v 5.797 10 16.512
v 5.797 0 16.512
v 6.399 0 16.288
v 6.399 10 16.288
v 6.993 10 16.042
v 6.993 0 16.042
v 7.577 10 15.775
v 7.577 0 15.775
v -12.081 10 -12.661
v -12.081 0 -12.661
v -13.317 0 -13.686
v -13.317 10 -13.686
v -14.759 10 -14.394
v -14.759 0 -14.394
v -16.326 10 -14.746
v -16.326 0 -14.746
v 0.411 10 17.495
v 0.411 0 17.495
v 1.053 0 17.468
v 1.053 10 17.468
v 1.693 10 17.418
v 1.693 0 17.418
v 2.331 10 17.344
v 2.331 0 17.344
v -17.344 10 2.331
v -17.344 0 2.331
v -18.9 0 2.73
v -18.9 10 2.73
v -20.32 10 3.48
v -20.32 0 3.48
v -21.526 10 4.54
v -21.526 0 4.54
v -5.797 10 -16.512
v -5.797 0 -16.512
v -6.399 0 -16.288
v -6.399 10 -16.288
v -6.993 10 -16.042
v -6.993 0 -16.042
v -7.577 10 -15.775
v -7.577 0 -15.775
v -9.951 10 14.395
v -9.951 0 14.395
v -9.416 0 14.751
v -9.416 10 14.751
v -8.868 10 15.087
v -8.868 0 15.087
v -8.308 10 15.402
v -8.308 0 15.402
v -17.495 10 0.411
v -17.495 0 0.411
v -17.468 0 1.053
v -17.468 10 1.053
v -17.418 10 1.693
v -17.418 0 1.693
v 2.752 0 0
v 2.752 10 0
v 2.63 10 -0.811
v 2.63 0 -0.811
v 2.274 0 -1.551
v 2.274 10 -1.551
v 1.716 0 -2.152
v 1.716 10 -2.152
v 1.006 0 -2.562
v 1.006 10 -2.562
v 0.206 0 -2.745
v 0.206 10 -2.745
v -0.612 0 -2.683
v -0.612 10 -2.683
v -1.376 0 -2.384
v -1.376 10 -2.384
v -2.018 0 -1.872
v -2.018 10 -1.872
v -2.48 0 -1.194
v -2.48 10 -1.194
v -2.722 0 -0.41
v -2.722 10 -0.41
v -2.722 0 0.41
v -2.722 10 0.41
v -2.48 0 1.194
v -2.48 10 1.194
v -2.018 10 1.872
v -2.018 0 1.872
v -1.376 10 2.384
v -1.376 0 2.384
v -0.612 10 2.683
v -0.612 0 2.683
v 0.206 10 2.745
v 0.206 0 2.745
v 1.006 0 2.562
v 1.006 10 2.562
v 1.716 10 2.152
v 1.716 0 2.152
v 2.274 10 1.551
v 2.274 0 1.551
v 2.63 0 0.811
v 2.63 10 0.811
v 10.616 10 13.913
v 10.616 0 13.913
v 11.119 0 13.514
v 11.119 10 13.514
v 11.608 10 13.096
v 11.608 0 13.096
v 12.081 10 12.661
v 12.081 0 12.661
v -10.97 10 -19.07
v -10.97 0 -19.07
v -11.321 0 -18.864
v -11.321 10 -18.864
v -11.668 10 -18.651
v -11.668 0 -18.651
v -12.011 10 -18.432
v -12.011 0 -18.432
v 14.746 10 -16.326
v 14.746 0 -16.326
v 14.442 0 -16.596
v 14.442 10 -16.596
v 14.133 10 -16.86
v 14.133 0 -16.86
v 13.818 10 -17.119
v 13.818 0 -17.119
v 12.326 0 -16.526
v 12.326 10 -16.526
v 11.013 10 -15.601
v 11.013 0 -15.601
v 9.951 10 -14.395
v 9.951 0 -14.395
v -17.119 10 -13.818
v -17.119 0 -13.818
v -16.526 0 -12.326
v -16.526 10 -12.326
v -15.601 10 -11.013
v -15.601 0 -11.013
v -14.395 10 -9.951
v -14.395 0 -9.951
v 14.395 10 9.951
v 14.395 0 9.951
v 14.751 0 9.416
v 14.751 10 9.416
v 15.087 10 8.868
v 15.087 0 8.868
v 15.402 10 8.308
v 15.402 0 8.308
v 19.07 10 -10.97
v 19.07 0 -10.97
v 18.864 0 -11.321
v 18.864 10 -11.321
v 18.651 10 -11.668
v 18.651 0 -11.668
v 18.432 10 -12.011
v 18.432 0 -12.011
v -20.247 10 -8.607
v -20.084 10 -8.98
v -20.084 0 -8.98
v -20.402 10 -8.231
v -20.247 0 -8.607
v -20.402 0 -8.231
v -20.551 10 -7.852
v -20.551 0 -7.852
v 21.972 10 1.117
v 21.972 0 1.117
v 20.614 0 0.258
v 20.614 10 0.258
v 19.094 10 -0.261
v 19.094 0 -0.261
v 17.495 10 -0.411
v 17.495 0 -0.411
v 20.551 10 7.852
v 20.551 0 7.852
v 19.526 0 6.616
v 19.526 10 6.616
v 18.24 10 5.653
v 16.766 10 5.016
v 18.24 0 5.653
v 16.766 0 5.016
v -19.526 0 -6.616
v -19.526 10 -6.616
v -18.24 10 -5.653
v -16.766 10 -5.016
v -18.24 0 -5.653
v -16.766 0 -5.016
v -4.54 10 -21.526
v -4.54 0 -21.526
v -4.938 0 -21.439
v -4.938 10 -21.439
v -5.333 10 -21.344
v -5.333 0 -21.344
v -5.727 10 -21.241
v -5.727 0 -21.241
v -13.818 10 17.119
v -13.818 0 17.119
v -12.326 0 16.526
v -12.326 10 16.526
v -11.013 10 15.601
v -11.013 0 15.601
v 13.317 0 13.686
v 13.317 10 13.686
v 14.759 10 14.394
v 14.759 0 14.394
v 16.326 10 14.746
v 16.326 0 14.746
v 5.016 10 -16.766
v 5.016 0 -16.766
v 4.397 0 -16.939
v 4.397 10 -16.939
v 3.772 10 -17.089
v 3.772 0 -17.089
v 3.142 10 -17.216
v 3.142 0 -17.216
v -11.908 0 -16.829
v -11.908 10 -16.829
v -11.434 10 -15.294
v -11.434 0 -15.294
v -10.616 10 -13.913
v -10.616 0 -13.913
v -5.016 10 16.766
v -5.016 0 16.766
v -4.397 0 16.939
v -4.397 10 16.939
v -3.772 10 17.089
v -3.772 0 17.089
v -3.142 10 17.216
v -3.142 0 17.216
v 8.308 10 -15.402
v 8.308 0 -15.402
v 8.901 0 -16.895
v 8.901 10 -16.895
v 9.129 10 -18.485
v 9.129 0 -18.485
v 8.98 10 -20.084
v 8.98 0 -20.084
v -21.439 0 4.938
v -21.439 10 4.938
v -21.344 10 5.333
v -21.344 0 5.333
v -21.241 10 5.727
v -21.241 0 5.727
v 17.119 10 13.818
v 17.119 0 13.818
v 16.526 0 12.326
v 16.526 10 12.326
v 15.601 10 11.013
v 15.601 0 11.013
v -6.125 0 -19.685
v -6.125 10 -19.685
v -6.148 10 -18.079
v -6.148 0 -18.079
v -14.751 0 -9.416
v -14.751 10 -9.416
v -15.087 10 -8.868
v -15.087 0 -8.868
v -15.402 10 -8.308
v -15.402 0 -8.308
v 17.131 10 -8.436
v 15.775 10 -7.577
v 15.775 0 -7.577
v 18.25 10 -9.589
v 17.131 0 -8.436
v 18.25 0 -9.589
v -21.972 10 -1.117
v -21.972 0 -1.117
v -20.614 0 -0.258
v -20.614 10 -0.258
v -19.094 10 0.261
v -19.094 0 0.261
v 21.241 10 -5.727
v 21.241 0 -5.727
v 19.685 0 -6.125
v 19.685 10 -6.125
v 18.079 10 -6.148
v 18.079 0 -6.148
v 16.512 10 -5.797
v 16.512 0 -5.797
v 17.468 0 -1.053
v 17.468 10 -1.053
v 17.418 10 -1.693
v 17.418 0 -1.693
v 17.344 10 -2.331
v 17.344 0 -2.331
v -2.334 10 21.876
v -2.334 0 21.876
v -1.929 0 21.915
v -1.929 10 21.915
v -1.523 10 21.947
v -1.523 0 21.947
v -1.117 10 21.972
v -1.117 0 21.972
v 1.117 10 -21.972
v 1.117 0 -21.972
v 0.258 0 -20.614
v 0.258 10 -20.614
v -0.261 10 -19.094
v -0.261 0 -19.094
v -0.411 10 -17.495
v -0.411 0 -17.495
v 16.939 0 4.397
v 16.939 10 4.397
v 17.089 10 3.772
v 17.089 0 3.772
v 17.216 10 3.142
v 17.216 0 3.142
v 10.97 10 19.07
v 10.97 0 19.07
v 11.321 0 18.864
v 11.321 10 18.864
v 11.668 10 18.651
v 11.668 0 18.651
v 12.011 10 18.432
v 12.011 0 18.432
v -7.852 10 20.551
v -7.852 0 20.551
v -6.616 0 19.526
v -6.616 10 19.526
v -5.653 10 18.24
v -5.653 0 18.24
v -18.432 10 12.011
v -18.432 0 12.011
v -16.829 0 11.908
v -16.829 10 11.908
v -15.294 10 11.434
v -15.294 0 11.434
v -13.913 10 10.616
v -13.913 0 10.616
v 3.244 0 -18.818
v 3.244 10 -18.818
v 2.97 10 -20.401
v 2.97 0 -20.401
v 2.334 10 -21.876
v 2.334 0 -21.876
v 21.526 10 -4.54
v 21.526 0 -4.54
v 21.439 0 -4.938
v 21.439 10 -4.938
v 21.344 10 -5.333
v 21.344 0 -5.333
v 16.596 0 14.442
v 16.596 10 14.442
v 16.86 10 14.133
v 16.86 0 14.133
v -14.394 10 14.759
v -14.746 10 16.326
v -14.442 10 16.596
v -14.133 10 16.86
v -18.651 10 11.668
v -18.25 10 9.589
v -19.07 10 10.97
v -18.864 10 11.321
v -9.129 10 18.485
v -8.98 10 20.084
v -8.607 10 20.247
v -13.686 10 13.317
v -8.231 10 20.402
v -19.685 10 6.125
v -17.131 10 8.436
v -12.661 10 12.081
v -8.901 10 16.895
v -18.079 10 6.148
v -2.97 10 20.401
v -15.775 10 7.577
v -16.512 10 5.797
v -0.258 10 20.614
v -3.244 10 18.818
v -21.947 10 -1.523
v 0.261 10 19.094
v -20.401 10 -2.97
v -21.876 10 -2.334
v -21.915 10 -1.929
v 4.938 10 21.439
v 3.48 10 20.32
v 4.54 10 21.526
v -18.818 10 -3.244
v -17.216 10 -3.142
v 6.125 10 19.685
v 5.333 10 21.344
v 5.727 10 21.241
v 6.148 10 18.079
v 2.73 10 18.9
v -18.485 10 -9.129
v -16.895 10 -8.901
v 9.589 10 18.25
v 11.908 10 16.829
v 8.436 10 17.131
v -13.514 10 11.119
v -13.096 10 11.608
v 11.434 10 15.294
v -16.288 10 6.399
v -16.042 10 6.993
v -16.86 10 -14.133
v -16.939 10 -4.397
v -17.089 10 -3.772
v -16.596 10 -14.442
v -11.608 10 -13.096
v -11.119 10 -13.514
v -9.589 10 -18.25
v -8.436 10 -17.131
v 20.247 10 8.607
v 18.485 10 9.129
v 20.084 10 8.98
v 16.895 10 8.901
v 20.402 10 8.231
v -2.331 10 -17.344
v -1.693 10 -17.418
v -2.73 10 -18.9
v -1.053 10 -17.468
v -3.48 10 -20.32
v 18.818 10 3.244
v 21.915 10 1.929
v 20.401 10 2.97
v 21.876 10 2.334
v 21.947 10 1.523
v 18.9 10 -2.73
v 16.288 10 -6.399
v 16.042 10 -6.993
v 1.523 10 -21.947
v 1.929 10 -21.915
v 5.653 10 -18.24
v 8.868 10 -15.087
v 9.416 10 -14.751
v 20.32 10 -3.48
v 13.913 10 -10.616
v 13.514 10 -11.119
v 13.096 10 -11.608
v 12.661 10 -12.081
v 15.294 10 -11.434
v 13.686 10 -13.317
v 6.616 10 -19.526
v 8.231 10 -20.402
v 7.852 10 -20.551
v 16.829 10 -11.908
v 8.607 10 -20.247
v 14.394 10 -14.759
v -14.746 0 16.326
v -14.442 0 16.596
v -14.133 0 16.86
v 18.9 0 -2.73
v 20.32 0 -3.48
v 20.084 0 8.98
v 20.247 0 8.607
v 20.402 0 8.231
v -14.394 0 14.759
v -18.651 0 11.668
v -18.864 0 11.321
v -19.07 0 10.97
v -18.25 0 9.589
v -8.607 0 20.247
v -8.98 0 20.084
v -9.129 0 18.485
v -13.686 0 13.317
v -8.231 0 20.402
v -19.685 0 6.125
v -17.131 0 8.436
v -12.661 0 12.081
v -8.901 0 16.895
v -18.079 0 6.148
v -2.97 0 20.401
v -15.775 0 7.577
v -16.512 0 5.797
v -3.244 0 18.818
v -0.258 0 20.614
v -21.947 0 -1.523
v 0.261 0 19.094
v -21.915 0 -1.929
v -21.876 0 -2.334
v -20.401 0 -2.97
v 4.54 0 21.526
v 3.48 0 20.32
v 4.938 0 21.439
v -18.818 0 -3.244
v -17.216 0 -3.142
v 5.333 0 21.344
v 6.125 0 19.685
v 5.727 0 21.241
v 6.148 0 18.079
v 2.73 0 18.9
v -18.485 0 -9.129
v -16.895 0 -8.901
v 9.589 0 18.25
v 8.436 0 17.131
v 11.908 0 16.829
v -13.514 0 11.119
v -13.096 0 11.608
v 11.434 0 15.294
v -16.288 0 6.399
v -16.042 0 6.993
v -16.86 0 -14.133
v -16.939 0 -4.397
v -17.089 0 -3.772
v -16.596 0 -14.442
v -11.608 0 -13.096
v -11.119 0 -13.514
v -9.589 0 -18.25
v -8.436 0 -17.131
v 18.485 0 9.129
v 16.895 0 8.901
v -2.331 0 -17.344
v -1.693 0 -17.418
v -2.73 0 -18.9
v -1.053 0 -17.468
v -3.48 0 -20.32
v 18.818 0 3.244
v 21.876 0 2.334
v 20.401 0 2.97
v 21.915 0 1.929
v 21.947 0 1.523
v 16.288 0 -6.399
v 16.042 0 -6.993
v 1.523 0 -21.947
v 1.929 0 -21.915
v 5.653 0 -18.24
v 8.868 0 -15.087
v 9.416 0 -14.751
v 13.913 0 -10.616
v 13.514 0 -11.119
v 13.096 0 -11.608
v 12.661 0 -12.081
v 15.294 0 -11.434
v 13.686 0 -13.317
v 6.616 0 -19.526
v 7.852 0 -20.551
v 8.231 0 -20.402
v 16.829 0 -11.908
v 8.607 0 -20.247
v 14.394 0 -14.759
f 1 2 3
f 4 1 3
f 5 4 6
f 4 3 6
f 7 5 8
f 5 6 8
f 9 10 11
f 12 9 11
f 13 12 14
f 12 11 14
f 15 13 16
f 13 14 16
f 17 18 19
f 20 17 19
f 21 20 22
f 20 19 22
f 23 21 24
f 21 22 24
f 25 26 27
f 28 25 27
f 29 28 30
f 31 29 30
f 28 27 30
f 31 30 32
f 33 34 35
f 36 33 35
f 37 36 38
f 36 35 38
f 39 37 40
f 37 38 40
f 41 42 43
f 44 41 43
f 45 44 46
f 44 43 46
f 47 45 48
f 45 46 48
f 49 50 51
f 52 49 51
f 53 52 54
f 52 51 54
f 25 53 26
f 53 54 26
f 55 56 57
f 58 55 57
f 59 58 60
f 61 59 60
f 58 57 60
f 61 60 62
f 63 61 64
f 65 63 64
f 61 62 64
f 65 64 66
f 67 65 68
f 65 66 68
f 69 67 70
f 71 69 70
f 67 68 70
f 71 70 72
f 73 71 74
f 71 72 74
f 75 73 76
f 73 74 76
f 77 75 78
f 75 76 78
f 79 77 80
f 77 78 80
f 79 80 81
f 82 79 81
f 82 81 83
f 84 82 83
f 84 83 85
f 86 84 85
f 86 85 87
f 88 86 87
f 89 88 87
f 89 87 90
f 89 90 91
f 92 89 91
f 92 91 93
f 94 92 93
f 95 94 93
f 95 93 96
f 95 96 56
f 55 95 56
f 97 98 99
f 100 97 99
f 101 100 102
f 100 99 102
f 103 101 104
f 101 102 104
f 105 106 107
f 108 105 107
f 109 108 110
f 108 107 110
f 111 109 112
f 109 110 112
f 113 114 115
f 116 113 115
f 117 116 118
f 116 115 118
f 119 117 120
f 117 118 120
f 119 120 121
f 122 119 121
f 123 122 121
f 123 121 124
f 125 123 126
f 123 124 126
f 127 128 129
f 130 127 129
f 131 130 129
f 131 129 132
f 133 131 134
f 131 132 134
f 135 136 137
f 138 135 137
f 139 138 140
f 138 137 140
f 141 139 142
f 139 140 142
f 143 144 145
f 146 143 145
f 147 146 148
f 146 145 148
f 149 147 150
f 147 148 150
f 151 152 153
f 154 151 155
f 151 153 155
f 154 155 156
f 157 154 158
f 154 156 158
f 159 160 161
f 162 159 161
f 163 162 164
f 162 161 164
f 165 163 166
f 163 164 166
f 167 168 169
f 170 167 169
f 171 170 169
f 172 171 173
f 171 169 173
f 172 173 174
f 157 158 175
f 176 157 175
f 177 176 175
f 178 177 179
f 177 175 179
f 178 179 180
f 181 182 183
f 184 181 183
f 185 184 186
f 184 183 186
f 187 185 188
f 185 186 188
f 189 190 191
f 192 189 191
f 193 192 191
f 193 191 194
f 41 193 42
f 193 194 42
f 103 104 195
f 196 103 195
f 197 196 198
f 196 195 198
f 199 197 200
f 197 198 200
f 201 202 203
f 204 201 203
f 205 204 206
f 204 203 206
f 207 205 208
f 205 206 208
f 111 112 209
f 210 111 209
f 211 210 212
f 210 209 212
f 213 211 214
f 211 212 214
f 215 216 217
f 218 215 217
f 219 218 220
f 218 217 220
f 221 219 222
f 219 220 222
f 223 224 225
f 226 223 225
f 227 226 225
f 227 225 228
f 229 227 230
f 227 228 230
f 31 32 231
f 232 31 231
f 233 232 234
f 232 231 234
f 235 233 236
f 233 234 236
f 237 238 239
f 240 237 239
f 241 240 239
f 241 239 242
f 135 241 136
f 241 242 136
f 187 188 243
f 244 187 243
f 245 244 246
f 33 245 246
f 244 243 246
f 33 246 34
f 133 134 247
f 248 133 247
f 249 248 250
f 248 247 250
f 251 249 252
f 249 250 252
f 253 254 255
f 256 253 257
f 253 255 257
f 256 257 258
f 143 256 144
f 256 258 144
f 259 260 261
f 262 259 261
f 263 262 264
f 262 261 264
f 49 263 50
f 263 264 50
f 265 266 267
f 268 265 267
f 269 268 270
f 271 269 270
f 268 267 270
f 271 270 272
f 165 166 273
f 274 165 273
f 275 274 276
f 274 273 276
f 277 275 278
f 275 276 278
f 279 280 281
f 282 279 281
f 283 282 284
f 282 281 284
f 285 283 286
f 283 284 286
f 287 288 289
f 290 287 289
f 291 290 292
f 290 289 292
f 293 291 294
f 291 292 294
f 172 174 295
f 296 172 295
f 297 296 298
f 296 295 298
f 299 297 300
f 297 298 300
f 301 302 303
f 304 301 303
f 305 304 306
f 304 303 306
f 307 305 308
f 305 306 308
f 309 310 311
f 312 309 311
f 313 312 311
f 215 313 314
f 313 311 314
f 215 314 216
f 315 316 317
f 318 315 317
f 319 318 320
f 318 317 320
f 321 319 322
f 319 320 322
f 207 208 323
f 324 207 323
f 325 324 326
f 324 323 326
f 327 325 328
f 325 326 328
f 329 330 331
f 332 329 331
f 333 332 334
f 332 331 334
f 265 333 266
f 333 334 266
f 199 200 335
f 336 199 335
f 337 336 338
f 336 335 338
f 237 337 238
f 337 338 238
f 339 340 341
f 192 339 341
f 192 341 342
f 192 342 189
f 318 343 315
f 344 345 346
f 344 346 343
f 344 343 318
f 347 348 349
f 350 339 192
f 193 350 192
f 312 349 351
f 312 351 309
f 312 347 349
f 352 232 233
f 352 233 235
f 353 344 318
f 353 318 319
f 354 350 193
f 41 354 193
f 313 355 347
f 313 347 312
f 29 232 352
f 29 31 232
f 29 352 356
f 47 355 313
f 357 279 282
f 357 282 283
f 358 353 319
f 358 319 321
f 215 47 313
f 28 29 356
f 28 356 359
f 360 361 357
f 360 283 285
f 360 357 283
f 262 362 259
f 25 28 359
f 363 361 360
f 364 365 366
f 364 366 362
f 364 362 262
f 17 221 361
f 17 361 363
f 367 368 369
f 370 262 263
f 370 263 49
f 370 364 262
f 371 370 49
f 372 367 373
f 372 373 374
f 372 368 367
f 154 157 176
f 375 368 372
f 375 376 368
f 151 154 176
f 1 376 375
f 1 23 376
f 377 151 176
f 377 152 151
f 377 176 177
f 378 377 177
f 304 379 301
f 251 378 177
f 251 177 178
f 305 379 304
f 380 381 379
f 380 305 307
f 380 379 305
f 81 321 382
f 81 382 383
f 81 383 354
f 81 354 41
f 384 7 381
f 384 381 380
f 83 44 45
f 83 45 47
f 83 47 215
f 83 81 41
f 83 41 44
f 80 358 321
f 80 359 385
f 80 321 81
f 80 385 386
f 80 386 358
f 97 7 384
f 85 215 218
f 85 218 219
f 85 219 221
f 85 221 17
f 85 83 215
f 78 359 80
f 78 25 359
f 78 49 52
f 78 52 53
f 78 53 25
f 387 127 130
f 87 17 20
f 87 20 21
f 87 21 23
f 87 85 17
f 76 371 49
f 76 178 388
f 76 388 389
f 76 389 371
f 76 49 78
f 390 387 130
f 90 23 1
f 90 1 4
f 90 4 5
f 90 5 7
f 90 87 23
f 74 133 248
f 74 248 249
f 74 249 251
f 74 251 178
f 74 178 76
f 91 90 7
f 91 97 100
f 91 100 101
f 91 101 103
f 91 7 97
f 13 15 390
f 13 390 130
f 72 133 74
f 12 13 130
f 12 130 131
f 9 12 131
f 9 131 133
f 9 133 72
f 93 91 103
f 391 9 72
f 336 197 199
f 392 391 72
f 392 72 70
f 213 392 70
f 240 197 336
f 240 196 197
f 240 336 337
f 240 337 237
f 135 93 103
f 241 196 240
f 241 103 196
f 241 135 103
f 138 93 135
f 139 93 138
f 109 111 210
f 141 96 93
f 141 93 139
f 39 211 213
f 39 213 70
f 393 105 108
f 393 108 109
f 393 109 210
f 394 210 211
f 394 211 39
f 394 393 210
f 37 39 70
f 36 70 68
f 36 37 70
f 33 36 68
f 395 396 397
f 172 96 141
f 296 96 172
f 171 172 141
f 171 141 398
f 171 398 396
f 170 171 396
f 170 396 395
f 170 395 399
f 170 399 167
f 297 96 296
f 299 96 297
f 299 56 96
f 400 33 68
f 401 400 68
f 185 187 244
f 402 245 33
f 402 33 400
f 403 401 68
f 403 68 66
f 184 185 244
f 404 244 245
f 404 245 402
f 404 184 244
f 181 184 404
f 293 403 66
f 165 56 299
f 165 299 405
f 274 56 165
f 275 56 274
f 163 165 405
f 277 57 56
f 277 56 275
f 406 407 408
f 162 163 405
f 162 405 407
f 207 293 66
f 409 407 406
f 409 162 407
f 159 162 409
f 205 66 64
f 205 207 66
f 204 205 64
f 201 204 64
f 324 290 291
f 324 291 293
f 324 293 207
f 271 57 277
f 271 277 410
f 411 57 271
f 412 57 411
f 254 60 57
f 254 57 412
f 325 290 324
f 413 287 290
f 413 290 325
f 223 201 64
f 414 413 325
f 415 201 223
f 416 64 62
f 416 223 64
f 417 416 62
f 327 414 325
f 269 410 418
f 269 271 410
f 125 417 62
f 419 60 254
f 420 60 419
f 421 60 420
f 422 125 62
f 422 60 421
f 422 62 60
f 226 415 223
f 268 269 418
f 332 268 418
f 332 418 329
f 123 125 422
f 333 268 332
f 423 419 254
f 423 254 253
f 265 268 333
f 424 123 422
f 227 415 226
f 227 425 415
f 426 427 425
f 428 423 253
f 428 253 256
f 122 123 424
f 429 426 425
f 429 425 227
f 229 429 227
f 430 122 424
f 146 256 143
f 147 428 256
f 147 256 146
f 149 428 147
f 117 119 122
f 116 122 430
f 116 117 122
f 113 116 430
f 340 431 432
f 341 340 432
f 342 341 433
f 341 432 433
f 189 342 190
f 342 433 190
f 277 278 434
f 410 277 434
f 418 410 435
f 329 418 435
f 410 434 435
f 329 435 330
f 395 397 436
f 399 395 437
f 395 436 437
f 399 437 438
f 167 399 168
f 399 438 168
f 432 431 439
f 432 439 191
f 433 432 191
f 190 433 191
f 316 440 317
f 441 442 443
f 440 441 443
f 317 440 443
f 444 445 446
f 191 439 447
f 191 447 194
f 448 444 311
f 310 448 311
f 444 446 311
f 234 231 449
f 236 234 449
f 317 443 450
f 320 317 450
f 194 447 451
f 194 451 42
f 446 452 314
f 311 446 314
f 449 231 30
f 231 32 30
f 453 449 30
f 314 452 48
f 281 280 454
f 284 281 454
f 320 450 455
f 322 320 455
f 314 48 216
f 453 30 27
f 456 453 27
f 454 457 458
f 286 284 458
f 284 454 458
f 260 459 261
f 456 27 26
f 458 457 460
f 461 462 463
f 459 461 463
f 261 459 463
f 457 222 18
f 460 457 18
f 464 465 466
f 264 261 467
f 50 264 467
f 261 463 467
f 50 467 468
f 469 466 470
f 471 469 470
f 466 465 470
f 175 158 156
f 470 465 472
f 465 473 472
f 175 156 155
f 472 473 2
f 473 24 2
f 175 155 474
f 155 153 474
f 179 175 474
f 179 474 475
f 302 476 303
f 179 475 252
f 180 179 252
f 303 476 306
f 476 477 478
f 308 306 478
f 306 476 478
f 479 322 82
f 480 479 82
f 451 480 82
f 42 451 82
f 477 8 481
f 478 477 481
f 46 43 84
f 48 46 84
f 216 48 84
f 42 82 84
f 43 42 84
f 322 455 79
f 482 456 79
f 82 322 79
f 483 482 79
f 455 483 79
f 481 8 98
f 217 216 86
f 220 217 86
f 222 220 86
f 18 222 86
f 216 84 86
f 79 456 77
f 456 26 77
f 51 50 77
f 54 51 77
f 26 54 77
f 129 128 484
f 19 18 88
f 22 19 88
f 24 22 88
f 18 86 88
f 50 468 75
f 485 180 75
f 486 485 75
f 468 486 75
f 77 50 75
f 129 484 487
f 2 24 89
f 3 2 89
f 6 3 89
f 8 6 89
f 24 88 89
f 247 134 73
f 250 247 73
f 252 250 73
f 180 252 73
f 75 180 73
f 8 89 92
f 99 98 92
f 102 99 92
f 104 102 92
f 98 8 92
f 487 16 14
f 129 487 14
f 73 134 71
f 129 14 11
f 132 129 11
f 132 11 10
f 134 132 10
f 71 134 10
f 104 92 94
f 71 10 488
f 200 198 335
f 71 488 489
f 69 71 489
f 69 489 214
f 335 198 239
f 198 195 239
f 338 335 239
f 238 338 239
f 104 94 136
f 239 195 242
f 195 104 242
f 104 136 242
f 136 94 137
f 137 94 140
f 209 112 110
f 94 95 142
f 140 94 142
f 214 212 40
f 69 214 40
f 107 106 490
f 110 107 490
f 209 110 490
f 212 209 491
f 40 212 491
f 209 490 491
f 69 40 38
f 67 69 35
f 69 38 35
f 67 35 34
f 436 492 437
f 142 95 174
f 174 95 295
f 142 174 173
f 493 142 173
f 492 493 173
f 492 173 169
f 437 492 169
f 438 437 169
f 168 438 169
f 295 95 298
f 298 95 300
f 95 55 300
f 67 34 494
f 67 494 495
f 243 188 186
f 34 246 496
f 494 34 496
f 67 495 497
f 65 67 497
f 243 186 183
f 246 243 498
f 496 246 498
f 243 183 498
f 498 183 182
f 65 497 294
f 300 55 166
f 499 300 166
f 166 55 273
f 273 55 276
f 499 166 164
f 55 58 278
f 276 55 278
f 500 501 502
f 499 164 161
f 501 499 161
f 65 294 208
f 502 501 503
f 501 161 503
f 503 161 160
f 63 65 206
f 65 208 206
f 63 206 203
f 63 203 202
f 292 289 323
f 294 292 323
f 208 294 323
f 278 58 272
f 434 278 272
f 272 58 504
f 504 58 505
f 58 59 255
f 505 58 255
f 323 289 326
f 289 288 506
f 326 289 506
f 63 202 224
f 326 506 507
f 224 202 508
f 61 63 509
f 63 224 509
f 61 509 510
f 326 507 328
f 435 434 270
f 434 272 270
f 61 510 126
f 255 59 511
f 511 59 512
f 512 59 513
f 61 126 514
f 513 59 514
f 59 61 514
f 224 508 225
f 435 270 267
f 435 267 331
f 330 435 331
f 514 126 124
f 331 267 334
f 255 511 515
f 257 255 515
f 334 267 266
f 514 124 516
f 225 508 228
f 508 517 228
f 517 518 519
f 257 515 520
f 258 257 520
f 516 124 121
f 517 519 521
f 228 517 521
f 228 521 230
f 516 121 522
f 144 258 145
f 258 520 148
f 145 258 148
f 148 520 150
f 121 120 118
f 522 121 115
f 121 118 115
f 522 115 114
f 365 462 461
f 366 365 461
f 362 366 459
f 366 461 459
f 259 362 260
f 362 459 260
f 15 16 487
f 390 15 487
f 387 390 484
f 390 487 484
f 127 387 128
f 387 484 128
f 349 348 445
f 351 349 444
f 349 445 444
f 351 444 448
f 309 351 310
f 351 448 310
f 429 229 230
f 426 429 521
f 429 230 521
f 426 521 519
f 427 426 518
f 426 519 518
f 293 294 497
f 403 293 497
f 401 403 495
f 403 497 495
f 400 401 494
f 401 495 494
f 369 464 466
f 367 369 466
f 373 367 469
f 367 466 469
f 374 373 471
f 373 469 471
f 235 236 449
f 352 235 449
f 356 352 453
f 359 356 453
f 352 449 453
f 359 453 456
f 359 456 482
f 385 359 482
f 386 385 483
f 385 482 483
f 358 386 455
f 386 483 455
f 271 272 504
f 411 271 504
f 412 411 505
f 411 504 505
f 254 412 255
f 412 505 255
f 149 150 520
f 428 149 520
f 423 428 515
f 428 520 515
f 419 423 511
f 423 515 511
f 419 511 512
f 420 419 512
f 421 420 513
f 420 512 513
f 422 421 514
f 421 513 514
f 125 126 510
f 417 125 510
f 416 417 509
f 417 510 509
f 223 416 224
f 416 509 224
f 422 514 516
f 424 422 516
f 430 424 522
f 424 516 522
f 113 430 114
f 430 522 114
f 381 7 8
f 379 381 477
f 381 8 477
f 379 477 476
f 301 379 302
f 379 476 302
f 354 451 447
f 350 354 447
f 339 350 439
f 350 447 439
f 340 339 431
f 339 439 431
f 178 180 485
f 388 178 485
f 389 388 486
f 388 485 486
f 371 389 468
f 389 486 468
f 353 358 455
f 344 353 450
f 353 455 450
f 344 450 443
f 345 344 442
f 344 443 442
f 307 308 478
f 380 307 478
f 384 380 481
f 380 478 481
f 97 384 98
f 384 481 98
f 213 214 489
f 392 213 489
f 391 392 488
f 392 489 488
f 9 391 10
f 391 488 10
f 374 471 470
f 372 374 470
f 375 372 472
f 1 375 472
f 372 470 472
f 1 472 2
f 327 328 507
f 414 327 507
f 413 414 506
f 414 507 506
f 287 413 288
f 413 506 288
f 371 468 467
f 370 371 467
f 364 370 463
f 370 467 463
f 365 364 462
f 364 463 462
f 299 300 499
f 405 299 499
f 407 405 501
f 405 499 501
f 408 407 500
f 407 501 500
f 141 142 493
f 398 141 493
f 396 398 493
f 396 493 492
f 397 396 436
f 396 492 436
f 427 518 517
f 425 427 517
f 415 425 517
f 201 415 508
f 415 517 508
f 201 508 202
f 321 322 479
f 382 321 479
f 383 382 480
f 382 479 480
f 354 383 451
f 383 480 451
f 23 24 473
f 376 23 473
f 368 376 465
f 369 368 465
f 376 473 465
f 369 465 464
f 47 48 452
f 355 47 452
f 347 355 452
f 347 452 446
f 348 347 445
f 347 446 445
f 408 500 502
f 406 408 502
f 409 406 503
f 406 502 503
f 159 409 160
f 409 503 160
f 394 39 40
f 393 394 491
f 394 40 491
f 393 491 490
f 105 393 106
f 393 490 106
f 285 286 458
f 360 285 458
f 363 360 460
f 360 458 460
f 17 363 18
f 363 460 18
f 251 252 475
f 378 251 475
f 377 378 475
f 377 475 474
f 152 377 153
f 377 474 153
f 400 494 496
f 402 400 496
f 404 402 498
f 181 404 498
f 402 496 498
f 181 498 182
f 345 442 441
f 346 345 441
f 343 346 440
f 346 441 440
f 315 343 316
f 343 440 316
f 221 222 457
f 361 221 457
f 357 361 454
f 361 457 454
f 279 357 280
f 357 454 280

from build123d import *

# Parameters (mm, degrees)
EXTRUDE_1_DEPTH          = 10
SKETCH_2_R               = 2.752434458
CUT_EXTRUDE_1_DEPTH      = 1
CUT_EXTRUDE_1_DEPTH_BACK = 11


with BuildPart() as part:
    # 草图1 → 凸台-拉伸1 (new body)
    with BuildSketch(Plane(origin=(0, 0, 0), x_dir=(1, 0, 0), z_dir=(0, 1, 0))):
        with BuildLine():
            ThreePointArc((1.117051771, 21.971622501), (-0.045961741, 19.869637729), (-0.410530178, 17.495184051))
            ThreePointArc((-0.410530178, 17.495184051), (-1.373034175, 17.44605334), (-2.331373887, 17.344010372))
            ThreePointArc((-2.331373887, 17.344010372), (-3.062900273, 19.632199517), (-4.540418022, 21.526369972))
            ThreePointArc((-4.540418022, 21.526369972), (-5.135798005, 21.392138249), (-5.727225381, 21.241442734))
            ThreePointArc((-5.727225381, 21.241442734), (-6.183767943, 18.882945479), (-5.796746593, 16.512047994))
            ThreePointArc((-5.796746593, 16.512047994), (-6.696960066, 16.167891819), (-7.576862283, 15.774699932))
            ThreePointArc((-7.576862283, 15.774699932), (-8.979674551, 17.724843043), (-10.970208295, 19.069728104))
            ThreePointArc((-10.970208295, 19.069728104), (-11.494968424, 18.758083616), (-12.010881809, 18.432002554))
            ThreePointArc((-12.010881809, 18.432002554), (-11.716263855, 16.047858961), (-10.615537062, 13.912597632))
            ThreePointArc((-10.615537062, 13.912597632), (-11.365340846, 13.307104398), (-12.080674608, 12.661251953))
            ThreePointArc((-12.080674608, 12.661251953), (-14.017455719, 14.082455436), (-16.326158146, 14.746408382))
            ThreePointArc((-16.326158146, 14.746408382), (-16.728931243, 14.287857063), (-17.118829441, 13.818309541))
            ThreePointArc((-17.118829441, 13.818309541), (-16.101890228, 11.641896196), (-14.395204801, 9.95128528))
            ThreePointArc((-14.395204801, 9.95128528), (-14.921202876, 9.143724883), (-15.40194633, 8.308432417))
            ThreePointArc((-15.40194633, 8.308432417), (-17.683110656, 9.061578973), (-20.083989887, 8.979607464))
            ThreePointArc((-20.083989887, 8.979607464), (-20.325349715, 8.419035512), (-20.551066773, 7.851984112))
            ThreePointArc((-20.551066773, 7.851984112), (-18.911351397, 6.096343517), (-16.765769597, 5.01587179))
            ThreePointArc((-16.765769597, 5.01587179), (-17.016473607, 4.085293867), (-17.215568235, 3.142325628))
            ThreePointArc((-17.215568235, 3.142325628), (-19.617819516, 3.153692024), (-21.875860765, 2.333820002))
            ThreePointArc((-21.875860765, 2.333820002), (-21.932181342, 1.726100106), (-21.971622501, 1.117051771))
            ThreePointArc((-21.971622501, 1.117051771), (-19.869637729, -0.045961741), (-17.495184051, -0.410530178))
            ThreePointArc((-17.495184051, -0.410530178), (-17.44605334, -1.373034175), (-17.344010372, -2.331373887))
            ThreePointArc((-17.344010372, -2.331373887), (-19.632199517, -3.062900273), (-21.526369972, -4.540418022))
            ThreePointArc((-21.526369972, -4.540418022), (-21.392138249, -5.135798005), (-21.241442734, -5.727225381))
            ThreePointArc((-21.241442734, -5.727225381), (-18.882945479, -6.183767943), (-16.512047994, -5.796746593))
            ThreePointArc((-16.512047994, -5.796746593), (-16.167891819, -6.696960066), (-15.774699932, -7.576862283))
            ThreePointArc((-15.774699932, -7.576862283), (-17.724843043, -8.979674551), (-19.069728104, -10.970208295))
            ThreePointArc((-19.069728104, -10.970208295), (-18.758083616, -11.494968424), (-18.432002554, -12.010881809))
            ThreePointArc((-18.432002554, -12.010881809), (-16.047858961, -11.716263855), (-13.912597632, -10.615537062))
            ThreePointArc((-13.912597632, -10.615537062), (-13.307104398, -11.365340846), (-12.661251953, -12.080674608))
            ThreePointArc((-12.661251953, -12.080674608), (-14.082455436, -14.017455719), (-14.746408382, -16.326158146))
            ThreePointArc((-14.746408382, -16.326158146), (-14.287857063, -16.728931243), (-13.818309541, -17.118829441))
            ThreePointArc((-13.818309541, -17.118829441), (-11.641896196, -16.101890228), (-9.95128528, -14.395204801))
            ThreePointArc((-9.95128528, -14.395204801), (-9.143724883, -14.921202876), (-8.308432417, -15.40194633))
            ThreePointArc((-8.308432417, -15.40194633), (-9.061578973, -17.683110656), (-8.979607464, -20.083989887))
            ThreePointArc((-8.979607464, -20.083989887), (-8.419035512, -20.325349715), (-7.851984112, -20.551066773))
            ThreePointArc((-7.851984112, -20.551066773), (-6.096343517, -18.911351397), (-5.01587179, -16.765769597))
            ThreePointArc((-5.01587179, -16.765769597), (-4.085293867, -17.016473607), (-3.142325628, -17.215568235))
            ThreePointArc((-3.142325628, -17.215568235), (-3.153692024, -19.617819516), (-2.333820002, -21.875860765))
            ThreePointArc((-2.333820002, -21.875860765), (-1.726100106, -21.932181342), (-1.117051771, -21.971622501))
            ThreePointArc((-1.117051771, -21.971622501), (0.045961741, -19.869637729), (0.410530178, -17.495184051))
            ThreePointArc((0.410530178, -17.495184051), (1.373034175, -17.44605334), (2.331373887, -17.344010372))
            ThreePointArc((2.331373887, -17.344010372), (3.062900273, -19.632199517), (4.540418022, -21.526369972))
            ThreePointArc((4.540418022, -21.526369972), (5.135798005, -21.392138249), (5.727225381, -21.241442734))
            ThreePointArc((5.727225381, -21.241442734), (6.183767943, -18.882945479), (5.796746593, -16.512047994))
            ThreePointArc((5.796746593, -16.512047994), (6.696960066, -16.167891819), (7.576862283, -15.774699932))
            ThreePointArc((7.576862283, -15.774699932), (8.979674551, -17.724843043), (10.970208295, -19.069728104))
            ThreePointArc((10.970208295, -19.069728104), (11.494968424, -18.758083616), (12.010881809, -18.432002554))
            ThreePointArc((12.010881809, -18.432002554), (11.716263855, -16.047858961), (10.615537062, -13.912597632))
            ThreePointArc((10.615537062, -13.912597632), (11.365340846, -13.307104398), (12.080674608, -12.661251953))
            ThreePointArc((12.080674608, -12.661251953), (14.017455719, -14.082455436), (16.326158146, -14.746408382))
            ThreePointArc((16.326158146, -14.746408382), (16.728931243, -14.287857063), (17.118829441, -13.818309541))
            ThreePointArc((17.118829441, -13.818309541), (16.101890228, -11.641896196), (14.395204801, -9.95128528))
            ThreePointArc((14.395204801, -9.95128528), (14.921202876, -9.143724883), (15.40194633, -8.308432417))
            ThreePointArc((15.40194633, -8.308432417), (17.683110656, -9.061578973), (20.083989887, -8.979607464))
            ThreePointArc((20.083989887, -8.979607464), (20.325349715, -8.419035512), (20.551066773, -7.851984112))
            ThreePointArc((20.551066773, -7.851984112), (18.911351397, -6.096343517), (16.765769597, -5.01587179))
            ThreePointArc((16.765769597, -5.01587179), (17.016473607, -4.085293867), (17.215568235, -3.142325628))
            ThreePointArc((17.215568235, -3.142325628), (19.617819516, -3.153692024), (21.875860765, -2.333820002))
            ThreePointArc((21.875860765, -2.333820002), (21.932181342, -1.726100106), (21.971622501, -1.117051771))
            ThreePointArc((21.971622501, -1.117051771), (19.869637729, 0.045961741), (17.495184051, 0.410530178))
            ThreePointArc((17.495184051, 0.410530178), (17.44605334, 1.373034175), (17.344010372, 2.331373887))
            ThreePointArc((17.344010372, 2.331373887), (19.632199517, 3.062900273), (21.526369972, 4.540418022))
            ThreePointArc((21.526369972, 4.540418022), (21.392138249, 5.135798005), (21.241442734, 5.727225381))
            ThreePointArc((21.241442734, 5.727225381), (18.882945479, 6.183767943), (16.512047994, 5.796746593))
            ThreePointArc((16.512047994, 5.796746593), (16.167891819, 6.696960066), (15.774699932, 7.576862283))
            ThreePointArc((15.774699932, 7.576862283), (17.724843043, 8.979674551), (19.069728104, 10.970208295))
            ThreePointArc((19.069728104, 10.970208295), (18.758083616, 11.494968424), (18.432002554, 12.010881809))
            ThreePointArc((18.432002554, 12.010881809), (16.047858961, 11.716263855), (13.912597632, 10.615537062))
            ThreePointArc((13.912597632, 10.615537062), (13.307104398, 11.365340846), (12.661251953, 12.080674608))
            ThreePointArc((12.661251953, 12.080674608), (14.082455436, 14.017455719), (14.746408382, 16.326158146))
            ThreePointArc((14.746408382, 16.326158146), (14.287857063, 16.728931243), (13.818309541, 17.118829441))
            ThreePointArc((13.818309541, 17.118829441), (11.641896196, 16.101890228), (9.95128528, 14.395204801))
            ThreePointArc((9.95128528, 14.395204801), (9.143724883, 14.921202876), (8.308432417, 15.40194633))
            ThreePointArc((8.308432417, 15.40194633), (9.061578973, 17.683110656), (8.979607464, 20.083989887))
            ThreePointArc((8.979607464, 20.083989887), (8.419035512, 20.325349715), (7.851984112, 20.551066773))
            ThreePointArc((7.851984112, 20.551066773), (6.096343517, 18.911351397), (5.01587179, 16.765769597))
            ThreePointArc((5.01587179, 16.765769597), (4.085293867, 17.016473607), (3.142325628, 17.215568235))
            ThreePointArc((3.142325628, 17.215568235), (3.153692024, 19.617819516), (2.333820002, 21.875860765))
            ThreePointArc((2.333820002, 21.875860765), (1.726100106, 21.932181342), (1.117051771, 21.971622501))
        make_face()
    extrude(amount=EXTRUDE_1_DEPTH)

    # 草图2 → 切除-拉伸1 (cut, two sides)
    with BuildSketch(Plane(origin=(0, 10, 0), x_dir=(1, 0, 0), z_dir=(0, 1, 0))) as cut_extrude_1_sk:
        Circle(SKETCH_2_R)
    extrude(amount=CUT_EXTRUDE_1_DEPTH, mode=Mode.SUBTRACT)
    extrude(cut_extrude_1_sk.sketch, amount=-CUT_EXTRUDE_1_DEPTH_BACK, mode=Mode.SUBTRACT)


solid = part.part
